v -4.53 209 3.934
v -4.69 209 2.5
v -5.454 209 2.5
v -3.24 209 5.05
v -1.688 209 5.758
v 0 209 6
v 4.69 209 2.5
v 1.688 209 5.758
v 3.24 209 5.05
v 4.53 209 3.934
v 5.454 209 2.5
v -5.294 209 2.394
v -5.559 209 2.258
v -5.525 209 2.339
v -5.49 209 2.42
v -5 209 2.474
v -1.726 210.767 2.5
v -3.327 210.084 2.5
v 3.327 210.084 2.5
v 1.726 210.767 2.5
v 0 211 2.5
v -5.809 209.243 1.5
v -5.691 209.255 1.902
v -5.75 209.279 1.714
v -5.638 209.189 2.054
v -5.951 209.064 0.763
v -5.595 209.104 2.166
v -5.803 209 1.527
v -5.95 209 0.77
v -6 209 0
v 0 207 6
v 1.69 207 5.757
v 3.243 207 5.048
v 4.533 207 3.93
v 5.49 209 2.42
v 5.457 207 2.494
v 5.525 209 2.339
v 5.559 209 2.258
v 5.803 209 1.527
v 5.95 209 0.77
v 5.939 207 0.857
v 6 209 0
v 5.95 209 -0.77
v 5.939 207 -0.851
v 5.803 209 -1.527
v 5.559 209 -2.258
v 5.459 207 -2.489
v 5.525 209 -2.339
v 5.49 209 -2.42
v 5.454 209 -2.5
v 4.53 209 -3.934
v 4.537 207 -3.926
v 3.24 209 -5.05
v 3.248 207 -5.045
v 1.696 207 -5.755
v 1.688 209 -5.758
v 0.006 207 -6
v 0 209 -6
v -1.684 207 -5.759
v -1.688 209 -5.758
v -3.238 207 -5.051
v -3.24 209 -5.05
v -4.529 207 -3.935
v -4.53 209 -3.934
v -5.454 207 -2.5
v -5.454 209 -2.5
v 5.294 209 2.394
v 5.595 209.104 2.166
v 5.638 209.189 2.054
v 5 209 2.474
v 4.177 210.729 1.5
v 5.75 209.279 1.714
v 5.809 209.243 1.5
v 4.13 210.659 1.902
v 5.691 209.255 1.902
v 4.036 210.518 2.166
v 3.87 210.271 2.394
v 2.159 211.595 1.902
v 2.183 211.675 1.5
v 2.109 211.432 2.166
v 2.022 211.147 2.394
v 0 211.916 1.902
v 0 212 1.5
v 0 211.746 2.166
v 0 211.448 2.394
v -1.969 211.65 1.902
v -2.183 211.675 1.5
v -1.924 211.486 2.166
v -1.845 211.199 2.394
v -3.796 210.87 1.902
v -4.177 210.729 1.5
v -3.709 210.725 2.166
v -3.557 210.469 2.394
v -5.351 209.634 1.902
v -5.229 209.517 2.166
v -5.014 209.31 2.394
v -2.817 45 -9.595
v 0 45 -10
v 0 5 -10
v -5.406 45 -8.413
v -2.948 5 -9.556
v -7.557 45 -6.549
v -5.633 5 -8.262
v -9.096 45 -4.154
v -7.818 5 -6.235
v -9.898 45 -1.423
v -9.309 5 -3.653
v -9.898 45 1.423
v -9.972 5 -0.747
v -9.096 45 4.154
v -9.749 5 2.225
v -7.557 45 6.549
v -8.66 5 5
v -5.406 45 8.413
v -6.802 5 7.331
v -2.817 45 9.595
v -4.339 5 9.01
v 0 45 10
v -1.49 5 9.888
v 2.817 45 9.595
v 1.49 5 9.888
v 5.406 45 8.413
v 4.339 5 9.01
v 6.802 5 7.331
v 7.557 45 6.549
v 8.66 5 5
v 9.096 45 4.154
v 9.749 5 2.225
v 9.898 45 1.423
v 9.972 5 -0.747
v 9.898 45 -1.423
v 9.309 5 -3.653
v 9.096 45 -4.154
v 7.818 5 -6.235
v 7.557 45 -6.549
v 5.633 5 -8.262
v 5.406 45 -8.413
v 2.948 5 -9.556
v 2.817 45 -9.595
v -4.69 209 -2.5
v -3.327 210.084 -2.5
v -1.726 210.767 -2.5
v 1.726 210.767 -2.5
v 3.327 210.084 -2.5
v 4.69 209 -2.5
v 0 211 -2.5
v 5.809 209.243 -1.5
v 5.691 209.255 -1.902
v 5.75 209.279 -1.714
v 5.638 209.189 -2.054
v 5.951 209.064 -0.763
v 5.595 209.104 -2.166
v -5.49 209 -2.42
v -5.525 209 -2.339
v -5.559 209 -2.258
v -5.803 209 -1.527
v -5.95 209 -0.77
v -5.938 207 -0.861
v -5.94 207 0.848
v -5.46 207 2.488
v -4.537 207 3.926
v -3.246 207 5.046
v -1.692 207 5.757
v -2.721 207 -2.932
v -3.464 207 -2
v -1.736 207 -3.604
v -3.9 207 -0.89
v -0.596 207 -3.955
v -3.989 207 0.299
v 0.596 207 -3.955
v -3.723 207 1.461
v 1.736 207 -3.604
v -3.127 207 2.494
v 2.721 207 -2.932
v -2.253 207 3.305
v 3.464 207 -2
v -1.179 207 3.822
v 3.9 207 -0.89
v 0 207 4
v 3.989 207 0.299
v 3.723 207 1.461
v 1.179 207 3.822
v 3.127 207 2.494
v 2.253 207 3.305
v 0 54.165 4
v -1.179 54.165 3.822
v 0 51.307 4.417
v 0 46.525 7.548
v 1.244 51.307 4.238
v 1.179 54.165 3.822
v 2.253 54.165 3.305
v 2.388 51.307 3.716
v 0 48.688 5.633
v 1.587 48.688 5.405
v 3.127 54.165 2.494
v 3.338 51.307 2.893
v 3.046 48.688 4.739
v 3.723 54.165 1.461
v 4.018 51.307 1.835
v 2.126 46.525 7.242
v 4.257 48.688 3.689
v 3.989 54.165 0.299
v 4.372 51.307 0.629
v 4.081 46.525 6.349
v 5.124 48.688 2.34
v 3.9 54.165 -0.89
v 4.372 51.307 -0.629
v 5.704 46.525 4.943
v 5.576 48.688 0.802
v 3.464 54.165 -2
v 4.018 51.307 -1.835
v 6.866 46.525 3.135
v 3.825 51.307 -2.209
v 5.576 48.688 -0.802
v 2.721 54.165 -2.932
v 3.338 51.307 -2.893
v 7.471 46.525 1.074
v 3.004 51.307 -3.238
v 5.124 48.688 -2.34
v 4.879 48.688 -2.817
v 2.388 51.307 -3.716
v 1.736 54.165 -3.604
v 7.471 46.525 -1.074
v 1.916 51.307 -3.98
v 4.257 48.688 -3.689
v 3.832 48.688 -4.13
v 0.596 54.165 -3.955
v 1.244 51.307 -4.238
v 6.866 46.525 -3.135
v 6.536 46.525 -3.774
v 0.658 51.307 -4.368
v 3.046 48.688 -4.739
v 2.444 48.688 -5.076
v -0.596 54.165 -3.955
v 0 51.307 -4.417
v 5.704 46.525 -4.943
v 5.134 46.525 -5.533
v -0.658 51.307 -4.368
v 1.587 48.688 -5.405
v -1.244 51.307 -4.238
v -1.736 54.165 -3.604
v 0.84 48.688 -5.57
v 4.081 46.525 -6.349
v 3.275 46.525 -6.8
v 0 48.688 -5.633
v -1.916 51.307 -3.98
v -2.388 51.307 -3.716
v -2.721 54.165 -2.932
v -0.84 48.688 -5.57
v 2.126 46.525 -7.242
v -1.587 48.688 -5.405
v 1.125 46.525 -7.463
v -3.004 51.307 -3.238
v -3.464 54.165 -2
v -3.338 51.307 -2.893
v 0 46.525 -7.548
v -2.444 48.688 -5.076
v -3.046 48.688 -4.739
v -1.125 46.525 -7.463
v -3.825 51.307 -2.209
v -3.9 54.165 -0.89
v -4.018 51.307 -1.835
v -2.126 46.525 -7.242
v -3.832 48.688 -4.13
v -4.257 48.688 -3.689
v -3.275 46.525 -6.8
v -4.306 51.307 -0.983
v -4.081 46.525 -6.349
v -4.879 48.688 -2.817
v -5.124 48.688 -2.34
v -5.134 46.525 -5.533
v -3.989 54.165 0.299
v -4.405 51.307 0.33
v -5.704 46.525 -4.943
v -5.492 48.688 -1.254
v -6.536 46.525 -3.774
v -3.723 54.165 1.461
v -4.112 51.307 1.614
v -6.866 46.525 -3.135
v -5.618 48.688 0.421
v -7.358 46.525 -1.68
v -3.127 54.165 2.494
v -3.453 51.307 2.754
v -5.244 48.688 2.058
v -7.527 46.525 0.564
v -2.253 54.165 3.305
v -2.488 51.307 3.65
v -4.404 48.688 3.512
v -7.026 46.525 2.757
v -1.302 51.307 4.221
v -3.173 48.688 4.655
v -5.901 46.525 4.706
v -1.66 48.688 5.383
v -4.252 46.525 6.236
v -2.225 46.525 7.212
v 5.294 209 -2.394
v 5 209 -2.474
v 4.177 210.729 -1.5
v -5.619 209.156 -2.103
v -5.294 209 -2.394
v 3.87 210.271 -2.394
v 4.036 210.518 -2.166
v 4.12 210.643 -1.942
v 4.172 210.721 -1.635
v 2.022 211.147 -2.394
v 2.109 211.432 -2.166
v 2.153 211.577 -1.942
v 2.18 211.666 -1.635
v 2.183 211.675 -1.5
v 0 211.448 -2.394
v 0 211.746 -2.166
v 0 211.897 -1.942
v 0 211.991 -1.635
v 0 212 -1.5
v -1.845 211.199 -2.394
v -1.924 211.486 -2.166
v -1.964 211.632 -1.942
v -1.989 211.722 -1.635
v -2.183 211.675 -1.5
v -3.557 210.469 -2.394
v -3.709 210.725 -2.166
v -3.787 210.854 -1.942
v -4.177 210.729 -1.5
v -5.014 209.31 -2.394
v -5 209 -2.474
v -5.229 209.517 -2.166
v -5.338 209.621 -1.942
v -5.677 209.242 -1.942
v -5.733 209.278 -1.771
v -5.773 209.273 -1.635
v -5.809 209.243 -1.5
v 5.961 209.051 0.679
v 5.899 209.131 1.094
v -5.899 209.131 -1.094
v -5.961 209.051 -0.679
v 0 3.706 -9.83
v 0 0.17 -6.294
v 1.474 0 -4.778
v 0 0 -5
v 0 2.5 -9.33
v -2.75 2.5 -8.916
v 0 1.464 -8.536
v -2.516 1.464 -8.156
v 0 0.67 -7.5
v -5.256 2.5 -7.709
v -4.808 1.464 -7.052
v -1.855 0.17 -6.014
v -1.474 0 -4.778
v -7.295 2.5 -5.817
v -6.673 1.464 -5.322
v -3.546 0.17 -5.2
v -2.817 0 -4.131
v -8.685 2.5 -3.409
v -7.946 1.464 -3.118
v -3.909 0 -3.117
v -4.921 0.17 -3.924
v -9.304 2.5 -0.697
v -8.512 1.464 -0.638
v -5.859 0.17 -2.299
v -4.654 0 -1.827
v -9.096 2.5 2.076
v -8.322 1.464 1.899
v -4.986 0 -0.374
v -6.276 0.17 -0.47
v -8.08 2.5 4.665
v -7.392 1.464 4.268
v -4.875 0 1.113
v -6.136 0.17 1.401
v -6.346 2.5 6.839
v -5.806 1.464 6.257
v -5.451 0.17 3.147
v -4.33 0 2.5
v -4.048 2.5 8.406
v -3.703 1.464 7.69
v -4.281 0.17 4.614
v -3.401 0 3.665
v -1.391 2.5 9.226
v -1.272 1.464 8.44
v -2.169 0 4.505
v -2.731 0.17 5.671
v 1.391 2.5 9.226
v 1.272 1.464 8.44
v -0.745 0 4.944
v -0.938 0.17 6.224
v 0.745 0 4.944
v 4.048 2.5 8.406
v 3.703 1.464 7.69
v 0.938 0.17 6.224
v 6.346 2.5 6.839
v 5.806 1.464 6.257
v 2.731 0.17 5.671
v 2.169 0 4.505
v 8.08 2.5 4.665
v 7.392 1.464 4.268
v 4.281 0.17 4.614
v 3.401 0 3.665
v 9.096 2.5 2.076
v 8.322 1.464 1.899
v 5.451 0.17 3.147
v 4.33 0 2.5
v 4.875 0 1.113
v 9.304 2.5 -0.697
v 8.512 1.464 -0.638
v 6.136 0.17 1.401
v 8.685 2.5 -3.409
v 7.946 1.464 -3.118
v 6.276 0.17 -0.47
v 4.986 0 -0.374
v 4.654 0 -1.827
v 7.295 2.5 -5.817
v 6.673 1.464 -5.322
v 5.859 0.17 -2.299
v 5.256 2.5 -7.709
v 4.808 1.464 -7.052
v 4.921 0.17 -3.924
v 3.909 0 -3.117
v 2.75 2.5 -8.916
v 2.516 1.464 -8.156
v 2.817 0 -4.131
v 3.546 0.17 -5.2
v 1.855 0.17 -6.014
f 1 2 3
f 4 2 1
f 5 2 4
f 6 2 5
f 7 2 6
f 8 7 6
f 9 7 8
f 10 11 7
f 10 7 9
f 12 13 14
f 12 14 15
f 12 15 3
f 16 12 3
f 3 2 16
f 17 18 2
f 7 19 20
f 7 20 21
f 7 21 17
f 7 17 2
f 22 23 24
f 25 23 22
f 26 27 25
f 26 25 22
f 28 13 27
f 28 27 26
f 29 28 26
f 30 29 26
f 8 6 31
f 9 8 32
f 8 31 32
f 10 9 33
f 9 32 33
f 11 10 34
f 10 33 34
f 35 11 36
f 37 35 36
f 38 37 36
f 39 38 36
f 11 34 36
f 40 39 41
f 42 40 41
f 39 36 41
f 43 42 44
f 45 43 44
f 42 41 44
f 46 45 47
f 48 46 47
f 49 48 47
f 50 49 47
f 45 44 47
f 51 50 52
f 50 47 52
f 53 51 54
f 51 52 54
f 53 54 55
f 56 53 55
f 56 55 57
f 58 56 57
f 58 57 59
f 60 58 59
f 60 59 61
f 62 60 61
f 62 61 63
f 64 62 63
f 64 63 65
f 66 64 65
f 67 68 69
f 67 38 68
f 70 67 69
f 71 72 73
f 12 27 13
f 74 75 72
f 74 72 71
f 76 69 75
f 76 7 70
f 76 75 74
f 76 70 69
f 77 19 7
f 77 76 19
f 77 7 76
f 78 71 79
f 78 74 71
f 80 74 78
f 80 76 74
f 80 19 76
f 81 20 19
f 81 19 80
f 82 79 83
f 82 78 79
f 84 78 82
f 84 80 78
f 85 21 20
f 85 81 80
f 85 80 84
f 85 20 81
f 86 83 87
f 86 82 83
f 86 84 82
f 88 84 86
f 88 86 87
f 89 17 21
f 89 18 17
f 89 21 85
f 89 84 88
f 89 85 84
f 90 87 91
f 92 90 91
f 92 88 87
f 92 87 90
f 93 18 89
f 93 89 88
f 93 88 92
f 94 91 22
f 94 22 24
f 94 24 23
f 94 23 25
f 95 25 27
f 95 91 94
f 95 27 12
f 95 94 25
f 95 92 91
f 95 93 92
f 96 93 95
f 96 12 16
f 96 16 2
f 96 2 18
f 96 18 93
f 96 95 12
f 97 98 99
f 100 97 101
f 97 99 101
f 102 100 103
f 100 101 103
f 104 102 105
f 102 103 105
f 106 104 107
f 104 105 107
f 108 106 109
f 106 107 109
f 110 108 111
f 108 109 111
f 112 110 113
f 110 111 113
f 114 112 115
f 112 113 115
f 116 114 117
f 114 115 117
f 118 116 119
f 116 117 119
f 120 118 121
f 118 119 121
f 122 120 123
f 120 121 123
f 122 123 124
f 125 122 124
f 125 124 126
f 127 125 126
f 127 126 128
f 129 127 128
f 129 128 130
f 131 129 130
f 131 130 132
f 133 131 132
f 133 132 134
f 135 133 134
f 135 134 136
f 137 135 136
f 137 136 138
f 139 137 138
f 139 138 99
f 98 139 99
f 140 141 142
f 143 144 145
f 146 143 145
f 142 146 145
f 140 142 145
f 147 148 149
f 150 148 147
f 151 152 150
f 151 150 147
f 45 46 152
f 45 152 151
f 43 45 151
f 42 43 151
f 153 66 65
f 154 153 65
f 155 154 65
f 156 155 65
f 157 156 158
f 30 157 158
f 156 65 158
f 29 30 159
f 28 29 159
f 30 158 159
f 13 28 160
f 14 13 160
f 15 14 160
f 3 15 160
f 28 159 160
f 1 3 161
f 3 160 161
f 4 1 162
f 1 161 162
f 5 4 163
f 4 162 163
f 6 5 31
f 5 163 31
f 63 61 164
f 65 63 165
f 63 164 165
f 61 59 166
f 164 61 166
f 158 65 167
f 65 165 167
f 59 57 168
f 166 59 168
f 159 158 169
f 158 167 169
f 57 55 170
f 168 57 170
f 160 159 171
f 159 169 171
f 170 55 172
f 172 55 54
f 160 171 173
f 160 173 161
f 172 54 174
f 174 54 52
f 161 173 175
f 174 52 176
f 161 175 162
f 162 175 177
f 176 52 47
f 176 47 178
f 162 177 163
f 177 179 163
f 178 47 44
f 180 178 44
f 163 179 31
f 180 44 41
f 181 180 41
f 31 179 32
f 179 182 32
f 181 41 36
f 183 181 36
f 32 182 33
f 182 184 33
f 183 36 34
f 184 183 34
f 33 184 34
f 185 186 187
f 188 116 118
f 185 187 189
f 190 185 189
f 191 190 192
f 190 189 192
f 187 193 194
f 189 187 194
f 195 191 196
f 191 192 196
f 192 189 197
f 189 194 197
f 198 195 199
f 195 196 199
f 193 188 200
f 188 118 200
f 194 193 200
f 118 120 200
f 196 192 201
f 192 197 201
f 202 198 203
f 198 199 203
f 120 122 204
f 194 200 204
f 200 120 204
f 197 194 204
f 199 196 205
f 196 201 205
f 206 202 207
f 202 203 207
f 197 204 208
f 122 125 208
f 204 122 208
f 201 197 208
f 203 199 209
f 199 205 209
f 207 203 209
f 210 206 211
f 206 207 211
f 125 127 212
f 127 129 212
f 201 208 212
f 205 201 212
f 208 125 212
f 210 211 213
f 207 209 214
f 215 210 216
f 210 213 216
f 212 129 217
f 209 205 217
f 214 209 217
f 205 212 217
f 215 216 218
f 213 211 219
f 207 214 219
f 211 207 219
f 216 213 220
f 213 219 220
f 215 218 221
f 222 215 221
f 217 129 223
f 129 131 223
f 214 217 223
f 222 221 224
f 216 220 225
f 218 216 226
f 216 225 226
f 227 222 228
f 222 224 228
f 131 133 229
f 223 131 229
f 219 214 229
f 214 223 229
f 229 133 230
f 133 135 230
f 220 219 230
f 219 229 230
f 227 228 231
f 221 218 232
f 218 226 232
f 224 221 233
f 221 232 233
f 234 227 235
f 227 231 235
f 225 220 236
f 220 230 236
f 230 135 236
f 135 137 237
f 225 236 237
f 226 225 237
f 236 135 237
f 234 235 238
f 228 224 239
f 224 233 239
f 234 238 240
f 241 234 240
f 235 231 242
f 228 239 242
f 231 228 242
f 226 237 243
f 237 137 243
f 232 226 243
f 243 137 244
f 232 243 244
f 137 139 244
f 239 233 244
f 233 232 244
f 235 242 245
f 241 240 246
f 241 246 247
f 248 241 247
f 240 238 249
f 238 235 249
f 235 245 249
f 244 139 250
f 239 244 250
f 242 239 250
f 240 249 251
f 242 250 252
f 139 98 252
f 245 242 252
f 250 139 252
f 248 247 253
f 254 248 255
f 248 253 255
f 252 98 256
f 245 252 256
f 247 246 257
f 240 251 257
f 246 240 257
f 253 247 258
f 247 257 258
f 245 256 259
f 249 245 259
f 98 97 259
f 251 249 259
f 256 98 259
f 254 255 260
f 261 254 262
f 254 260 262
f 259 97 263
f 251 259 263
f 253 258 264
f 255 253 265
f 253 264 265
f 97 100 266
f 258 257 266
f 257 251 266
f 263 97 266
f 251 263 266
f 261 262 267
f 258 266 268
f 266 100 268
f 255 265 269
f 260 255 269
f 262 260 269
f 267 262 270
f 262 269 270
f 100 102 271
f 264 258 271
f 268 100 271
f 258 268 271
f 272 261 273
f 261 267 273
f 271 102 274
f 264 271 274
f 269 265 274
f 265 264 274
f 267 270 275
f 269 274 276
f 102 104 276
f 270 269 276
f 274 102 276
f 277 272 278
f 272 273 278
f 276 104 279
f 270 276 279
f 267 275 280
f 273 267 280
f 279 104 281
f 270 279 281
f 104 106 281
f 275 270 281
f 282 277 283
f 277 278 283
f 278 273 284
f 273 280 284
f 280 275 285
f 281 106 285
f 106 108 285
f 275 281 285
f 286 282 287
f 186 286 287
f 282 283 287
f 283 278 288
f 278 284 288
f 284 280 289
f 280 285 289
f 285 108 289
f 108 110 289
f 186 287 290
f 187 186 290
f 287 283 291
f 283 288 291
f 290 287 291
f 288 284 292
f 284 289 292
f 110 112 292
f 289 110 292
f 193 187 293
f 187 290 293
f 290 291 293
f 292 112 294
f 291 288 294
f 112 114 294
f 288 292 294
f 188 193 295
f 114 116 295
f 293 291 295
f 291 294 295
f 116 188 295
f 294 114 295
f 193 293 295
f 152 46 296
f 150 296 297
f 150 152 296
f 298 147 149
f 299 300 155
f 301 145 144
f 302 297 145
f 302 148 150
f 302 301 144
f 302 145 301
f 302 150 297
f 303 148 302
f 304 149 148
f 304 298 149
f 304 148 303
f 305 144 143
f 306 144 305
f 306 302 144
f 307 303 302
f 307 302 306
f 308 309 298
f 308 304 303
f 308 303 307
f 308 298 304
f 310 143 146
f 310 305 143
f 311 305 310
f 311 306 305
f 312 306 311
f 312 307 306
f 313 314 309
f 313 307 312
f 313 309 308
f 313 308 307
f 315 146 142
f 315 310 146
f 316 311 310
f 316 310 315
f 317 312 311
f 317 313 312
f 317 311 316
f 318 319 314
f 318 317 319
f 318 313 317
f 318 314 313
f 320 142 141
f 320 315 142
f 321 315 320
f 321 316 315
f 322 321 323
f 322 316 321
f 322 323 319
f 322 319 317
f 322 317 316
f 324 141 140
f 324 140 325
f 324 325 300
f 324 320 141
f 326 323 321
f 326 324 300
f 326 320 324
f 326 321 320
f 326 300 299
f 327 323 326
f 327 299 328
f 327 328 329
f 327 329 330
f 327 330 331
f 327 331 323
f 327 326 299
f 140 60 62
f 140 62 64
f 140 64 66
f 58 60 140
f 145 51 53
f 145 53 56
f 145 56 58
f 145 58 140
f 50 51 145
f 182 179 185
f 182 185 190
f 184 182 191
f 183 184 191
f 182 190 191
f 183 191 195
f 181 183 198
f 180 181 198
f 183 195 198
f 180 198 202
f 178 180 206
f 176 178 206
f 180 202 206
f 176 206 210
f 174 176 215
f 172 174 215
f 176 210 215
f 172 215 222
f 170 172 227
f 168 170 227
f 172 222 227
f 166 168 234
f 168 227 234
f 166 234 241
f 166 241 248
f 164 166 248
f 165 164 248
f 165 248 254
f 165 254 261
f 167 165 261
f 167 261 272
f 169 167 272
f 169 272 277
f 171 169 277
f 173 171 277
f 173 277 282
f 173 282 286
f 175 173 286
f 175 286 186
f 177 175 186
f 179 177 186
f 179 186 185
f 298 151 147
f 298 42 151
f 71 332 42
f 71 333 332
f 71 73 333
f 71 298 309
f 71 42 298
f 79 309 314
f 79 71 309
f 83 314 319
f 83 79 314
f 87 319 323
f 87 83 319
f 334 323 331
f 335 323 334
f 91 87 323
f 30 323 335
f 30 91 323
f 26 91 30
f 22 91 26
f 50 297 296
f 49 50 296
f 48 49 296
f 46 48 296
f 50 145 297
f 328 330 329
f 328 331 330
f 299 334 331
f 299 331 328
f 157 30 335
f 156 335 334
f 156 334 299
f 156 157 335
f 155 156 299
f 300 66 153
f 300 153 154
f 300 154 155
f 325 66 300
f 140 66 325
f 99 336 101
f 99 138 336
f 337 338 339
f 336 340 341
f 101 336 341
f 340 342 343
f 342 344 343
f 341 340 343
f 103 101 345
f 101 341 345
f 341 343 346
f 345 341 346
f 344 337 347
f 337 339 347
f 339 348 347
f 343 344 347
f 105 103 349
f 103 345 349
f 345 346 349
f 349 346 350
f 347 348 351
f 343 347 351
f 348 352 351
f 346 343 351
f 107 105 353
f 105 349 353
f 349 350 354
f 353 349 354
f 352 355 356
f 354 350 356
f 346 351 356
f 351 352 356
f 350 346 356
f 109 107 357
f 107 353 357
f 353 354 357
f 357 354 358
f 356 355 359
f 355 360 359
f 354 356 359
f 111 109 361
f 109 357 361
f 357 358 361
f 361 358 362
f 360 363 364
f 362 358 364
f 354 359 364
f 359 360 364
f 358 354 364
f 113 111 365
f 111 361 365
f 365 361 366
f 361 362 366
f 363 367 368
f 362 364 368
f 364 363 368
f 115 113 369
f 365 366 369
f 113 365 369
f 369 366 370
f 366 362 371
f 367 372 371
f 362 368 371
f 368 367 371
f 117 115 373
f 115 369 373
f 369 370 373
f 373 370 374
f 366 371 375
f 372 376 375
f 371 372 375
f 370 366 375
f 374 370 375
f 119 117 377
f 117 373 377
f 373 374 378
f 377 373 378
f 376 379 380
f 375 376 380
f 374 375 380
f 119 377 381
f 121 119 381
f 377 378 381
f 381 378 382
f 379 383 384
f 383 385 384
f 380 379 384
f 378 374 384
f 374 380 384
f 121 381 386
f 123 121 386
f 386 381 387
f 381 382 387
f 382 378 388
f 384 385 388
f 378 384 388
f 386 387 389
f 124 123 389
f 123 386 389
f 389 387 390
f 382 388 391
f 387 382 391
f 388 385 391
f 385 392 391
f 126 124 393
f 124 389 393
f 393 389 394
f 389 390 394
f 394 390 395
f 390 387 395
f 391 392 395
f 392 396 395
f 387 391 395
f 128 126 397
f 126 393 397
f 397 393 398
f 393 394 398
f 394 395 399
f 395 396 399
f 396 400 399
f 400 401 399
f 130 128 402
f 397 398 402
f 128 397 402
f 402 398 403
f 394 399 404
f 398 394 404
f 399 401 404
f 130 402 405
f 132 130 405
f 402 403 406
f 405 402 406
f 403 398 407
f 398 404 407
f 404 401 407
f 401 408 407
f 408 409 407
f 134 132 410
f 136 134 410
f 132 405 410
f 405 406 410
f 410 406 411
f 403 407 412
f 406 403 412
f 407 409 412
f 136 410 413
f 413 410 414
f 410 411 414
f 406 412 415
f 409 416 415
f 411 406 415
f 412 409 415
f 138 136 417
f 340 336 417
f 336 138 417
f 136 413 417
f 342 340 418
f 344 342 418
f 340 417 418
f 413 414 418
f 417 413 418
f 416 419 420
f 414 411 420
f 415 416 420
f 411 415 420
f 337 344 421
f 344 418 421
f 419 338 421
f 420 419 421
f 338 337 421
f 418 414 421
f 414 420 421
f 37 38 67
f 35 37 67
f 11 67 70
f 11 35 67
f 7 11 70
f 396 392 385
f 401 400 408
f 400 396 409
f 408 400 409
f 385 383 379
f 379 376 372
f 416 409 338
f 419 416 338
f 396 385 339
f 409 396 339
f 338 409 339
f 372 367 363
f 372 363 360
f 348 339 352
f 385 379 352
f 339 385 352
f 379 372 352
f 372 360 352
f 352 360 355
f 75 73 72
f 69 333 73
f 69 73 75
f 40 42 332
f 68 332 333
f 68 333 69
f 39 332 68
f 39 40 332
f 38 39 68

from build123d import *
from build123d.topology import SkipClean

# Parameters (mm, degrees)
SKETCH1_R           = 10
BOSS_EXTRUDE1_DEPTH = 45
FILLET1_R           = 5
SKETCH2_R           = 4
BOSS_EXTRUDE2_DEPTH = 162
SKETCH3_R           = 6
BOSS_EXTRUDE3_DEPTH = 2
BOSS_EXTRUDE4_DEPTH = 2.5
SKETCH5_OUTSIDE_W   = 64.776
SKETCH5_OUTSIDE_H   = 64.776
SKETCH5_OUTSIDE_R   = 6
CUT_EXTRUDE2_DEPTH  = 5
FILLET2_R           = 10
FILLET3_R           = 1


with BuildPart() as part:
    # Sketch1 → Boss-Extrude1 (new body)
    with BuildSketch(Plane(origin=(0, 0, 0), x_dir=(1, 0, 0), z_dir=(0, 1, 0))):
        with Locations(Location((0, 0, 0), (0, 0, 90))):
            Circle(SKETCH1_R)
    extrude(amount=BOSS_EXTRUDE1_DEPTH)

    # Fillet1
    fillet1_edges = [part.edges().sort_by_distance(p)[0] for p in [
        (0, 0, 10),
    ]]
    fillet(fillet1_edges, radius=FILLET1_R)

    # Sketch2 → Boss-Extrude2 (add)
    with BuildSketch(Plane(origin=(0, 45, 0), x_dir=(1, 0, 0), z_dir=(0, 1, 0))):
        with Locations(Location((0, 0, 0), (0, 0, 270))):
            Circle(SKETCH2_R)
    extrude(amount=BOSS_EXTRUDE2_DEPTH)

    # Sketch3 → Boss-Extrude3 (add)
    with BuildSketch(Plane(origin=(0, 207, 0), x_dir=(1, 0, 0), z_dir=(0, 1, 0))):
        with Locations(Location((0, 0, 0), (0, 0, 270))):
            Circle(SKETCH3_R)
    extrude(amount=BOSS_EXTRUDE3_DEPTH)

    # Sketch4 → Boss-Extrude4 (add, symmetric)
    with BuildSketch(Plane.XY):
        with BuildLine():
            Line((-6, 209), (6, 209))
            ThreePointArc((6, 209), (0, 212), (-6, 209))
        make_face()
    extrude(amount=BOSS_EXTRUDE4_DEPTH, both=True)

    # Sketch5 outside → Cut-Extrude2 (cut)
    with SkipClean():  # the faces are left unmerged after this step: merging them gives an invalid solid
        with BuildSketch(Plane.XZ.offset(-207)):
            Rectangle(SKETCH5_OUTSIDE_W, SKETCH5_OUTSIDE_H)
            with Locations(Location((0, 0, 0), (0, 0, 204.624318352))):
                Circle(SKETCH5_OUTSIDE_R, mode=Mode.SUBTRACT)
        extrude(amount=-CUT_EXTRUDE2_DEPTH, mode=Mode.SUBTRACT)
    add(part.part.scale(1), mode=Mode.REPLACE)  # the faces are merged on a copy

    # Fillet2
    # the kernel refuses this fillet: 10 mm, written as the material it adds along each edge
    with BuildSketch(Plane(origin=(0, 45, 0), x_dir=(0, 0, 1), z_dir=(-1, 0, 0))) as fillet2_piece_1:
        with BuildLine():
            CenterArc((14, 9.16515139), FILLET2_R, 180, 66.421821522)
            Line((10, 0), (9.92, -0.183303028))
            ThreePointArc((9.92, -0.183303028), (7, -0.2), (4, -0.2))
            Line((4, -0.2), (3.8, 0))
            Line((3.8, 0), (3.8, 9.16515139))
            Line((3.8, 9.16515139), (4, 9.16515139))
        make_face()
    revolve(axis=Axis((0, 45, 0), (0, 1, 0)))

    # Fillet3
    # the kernel refuses this fillet: 1 mm, written as the material it takes off along each edge
    with BuildSketch(Plane(origin=(0, 204.5, -2.5), x_dir=(0.9118550245849949, 0.41051238000710544, 0), z_dir=(0.41051238000710544, -0.9118550245849949, 0))) as fillet3_piece_1_section:
        with BuildLine():
            CenterArc((7.5 - FILLET3_R, FILLET3_R), FILLET3_R, 270, 90)
            Line((7.5, FILLET3_R), (7.5, 0))
            Line((7.5, 0), (7.5 - FILLET3_R, 0))
        make_face()
    fillet3_piece_1 = revolve(axis=Axis((0, 204.5, -2.5), (0, 0, 1)), revolution_arc=131.52594845, mode=Mode.PRIVATE)
    fillet3_piece_1 = split(fillet3_piece_1, bisect_by=Plane(origin=(0, 209, -2.216936938), z_dir=(0, 1, 0)), keep=Keep.TOP, mode=Mode.PRIVATE)
    add(fillet3_piece_1, mode=Mode.SUBTRACT)
    with BuildSketch(Plane(origin=(0, 204.5, 2.5), x_dir=(0.9118550245849949, 0.4105123800071055, 0), z_dir=(0.4105123800071055, -0.9118550245849949, 0))) as fillet3_piece_2_section:
        with BuildLine():
            CenterArc((7.5 - FILLET3_R, -FILLET3_R), FILLET3_R, 0, 90)
            Line((7.5 - FILLET3_R, 0), (7.5, 0))
            Line((7.5, 0), (7.5, -FILLET3_R))
        make_face()
    fillet3_piece_2 = revolve(axis=Axis((0, 204.5, 2.5), (0, 0, 1)), revolution_arc=131.52594845, mode=Mode.PRIVATE)
    fillet3_piece_2 = split(fillet3_piece_2, bisect_by=Plane(origin=(0, 209, 2.216936937), z_dir=(0, 1, 0)), keep=Keep.TOP, mode=Mode.PRIVATE)
    add(fillet3_piece_2, mode=Mode.SUBTRACT)


solid = part.part
